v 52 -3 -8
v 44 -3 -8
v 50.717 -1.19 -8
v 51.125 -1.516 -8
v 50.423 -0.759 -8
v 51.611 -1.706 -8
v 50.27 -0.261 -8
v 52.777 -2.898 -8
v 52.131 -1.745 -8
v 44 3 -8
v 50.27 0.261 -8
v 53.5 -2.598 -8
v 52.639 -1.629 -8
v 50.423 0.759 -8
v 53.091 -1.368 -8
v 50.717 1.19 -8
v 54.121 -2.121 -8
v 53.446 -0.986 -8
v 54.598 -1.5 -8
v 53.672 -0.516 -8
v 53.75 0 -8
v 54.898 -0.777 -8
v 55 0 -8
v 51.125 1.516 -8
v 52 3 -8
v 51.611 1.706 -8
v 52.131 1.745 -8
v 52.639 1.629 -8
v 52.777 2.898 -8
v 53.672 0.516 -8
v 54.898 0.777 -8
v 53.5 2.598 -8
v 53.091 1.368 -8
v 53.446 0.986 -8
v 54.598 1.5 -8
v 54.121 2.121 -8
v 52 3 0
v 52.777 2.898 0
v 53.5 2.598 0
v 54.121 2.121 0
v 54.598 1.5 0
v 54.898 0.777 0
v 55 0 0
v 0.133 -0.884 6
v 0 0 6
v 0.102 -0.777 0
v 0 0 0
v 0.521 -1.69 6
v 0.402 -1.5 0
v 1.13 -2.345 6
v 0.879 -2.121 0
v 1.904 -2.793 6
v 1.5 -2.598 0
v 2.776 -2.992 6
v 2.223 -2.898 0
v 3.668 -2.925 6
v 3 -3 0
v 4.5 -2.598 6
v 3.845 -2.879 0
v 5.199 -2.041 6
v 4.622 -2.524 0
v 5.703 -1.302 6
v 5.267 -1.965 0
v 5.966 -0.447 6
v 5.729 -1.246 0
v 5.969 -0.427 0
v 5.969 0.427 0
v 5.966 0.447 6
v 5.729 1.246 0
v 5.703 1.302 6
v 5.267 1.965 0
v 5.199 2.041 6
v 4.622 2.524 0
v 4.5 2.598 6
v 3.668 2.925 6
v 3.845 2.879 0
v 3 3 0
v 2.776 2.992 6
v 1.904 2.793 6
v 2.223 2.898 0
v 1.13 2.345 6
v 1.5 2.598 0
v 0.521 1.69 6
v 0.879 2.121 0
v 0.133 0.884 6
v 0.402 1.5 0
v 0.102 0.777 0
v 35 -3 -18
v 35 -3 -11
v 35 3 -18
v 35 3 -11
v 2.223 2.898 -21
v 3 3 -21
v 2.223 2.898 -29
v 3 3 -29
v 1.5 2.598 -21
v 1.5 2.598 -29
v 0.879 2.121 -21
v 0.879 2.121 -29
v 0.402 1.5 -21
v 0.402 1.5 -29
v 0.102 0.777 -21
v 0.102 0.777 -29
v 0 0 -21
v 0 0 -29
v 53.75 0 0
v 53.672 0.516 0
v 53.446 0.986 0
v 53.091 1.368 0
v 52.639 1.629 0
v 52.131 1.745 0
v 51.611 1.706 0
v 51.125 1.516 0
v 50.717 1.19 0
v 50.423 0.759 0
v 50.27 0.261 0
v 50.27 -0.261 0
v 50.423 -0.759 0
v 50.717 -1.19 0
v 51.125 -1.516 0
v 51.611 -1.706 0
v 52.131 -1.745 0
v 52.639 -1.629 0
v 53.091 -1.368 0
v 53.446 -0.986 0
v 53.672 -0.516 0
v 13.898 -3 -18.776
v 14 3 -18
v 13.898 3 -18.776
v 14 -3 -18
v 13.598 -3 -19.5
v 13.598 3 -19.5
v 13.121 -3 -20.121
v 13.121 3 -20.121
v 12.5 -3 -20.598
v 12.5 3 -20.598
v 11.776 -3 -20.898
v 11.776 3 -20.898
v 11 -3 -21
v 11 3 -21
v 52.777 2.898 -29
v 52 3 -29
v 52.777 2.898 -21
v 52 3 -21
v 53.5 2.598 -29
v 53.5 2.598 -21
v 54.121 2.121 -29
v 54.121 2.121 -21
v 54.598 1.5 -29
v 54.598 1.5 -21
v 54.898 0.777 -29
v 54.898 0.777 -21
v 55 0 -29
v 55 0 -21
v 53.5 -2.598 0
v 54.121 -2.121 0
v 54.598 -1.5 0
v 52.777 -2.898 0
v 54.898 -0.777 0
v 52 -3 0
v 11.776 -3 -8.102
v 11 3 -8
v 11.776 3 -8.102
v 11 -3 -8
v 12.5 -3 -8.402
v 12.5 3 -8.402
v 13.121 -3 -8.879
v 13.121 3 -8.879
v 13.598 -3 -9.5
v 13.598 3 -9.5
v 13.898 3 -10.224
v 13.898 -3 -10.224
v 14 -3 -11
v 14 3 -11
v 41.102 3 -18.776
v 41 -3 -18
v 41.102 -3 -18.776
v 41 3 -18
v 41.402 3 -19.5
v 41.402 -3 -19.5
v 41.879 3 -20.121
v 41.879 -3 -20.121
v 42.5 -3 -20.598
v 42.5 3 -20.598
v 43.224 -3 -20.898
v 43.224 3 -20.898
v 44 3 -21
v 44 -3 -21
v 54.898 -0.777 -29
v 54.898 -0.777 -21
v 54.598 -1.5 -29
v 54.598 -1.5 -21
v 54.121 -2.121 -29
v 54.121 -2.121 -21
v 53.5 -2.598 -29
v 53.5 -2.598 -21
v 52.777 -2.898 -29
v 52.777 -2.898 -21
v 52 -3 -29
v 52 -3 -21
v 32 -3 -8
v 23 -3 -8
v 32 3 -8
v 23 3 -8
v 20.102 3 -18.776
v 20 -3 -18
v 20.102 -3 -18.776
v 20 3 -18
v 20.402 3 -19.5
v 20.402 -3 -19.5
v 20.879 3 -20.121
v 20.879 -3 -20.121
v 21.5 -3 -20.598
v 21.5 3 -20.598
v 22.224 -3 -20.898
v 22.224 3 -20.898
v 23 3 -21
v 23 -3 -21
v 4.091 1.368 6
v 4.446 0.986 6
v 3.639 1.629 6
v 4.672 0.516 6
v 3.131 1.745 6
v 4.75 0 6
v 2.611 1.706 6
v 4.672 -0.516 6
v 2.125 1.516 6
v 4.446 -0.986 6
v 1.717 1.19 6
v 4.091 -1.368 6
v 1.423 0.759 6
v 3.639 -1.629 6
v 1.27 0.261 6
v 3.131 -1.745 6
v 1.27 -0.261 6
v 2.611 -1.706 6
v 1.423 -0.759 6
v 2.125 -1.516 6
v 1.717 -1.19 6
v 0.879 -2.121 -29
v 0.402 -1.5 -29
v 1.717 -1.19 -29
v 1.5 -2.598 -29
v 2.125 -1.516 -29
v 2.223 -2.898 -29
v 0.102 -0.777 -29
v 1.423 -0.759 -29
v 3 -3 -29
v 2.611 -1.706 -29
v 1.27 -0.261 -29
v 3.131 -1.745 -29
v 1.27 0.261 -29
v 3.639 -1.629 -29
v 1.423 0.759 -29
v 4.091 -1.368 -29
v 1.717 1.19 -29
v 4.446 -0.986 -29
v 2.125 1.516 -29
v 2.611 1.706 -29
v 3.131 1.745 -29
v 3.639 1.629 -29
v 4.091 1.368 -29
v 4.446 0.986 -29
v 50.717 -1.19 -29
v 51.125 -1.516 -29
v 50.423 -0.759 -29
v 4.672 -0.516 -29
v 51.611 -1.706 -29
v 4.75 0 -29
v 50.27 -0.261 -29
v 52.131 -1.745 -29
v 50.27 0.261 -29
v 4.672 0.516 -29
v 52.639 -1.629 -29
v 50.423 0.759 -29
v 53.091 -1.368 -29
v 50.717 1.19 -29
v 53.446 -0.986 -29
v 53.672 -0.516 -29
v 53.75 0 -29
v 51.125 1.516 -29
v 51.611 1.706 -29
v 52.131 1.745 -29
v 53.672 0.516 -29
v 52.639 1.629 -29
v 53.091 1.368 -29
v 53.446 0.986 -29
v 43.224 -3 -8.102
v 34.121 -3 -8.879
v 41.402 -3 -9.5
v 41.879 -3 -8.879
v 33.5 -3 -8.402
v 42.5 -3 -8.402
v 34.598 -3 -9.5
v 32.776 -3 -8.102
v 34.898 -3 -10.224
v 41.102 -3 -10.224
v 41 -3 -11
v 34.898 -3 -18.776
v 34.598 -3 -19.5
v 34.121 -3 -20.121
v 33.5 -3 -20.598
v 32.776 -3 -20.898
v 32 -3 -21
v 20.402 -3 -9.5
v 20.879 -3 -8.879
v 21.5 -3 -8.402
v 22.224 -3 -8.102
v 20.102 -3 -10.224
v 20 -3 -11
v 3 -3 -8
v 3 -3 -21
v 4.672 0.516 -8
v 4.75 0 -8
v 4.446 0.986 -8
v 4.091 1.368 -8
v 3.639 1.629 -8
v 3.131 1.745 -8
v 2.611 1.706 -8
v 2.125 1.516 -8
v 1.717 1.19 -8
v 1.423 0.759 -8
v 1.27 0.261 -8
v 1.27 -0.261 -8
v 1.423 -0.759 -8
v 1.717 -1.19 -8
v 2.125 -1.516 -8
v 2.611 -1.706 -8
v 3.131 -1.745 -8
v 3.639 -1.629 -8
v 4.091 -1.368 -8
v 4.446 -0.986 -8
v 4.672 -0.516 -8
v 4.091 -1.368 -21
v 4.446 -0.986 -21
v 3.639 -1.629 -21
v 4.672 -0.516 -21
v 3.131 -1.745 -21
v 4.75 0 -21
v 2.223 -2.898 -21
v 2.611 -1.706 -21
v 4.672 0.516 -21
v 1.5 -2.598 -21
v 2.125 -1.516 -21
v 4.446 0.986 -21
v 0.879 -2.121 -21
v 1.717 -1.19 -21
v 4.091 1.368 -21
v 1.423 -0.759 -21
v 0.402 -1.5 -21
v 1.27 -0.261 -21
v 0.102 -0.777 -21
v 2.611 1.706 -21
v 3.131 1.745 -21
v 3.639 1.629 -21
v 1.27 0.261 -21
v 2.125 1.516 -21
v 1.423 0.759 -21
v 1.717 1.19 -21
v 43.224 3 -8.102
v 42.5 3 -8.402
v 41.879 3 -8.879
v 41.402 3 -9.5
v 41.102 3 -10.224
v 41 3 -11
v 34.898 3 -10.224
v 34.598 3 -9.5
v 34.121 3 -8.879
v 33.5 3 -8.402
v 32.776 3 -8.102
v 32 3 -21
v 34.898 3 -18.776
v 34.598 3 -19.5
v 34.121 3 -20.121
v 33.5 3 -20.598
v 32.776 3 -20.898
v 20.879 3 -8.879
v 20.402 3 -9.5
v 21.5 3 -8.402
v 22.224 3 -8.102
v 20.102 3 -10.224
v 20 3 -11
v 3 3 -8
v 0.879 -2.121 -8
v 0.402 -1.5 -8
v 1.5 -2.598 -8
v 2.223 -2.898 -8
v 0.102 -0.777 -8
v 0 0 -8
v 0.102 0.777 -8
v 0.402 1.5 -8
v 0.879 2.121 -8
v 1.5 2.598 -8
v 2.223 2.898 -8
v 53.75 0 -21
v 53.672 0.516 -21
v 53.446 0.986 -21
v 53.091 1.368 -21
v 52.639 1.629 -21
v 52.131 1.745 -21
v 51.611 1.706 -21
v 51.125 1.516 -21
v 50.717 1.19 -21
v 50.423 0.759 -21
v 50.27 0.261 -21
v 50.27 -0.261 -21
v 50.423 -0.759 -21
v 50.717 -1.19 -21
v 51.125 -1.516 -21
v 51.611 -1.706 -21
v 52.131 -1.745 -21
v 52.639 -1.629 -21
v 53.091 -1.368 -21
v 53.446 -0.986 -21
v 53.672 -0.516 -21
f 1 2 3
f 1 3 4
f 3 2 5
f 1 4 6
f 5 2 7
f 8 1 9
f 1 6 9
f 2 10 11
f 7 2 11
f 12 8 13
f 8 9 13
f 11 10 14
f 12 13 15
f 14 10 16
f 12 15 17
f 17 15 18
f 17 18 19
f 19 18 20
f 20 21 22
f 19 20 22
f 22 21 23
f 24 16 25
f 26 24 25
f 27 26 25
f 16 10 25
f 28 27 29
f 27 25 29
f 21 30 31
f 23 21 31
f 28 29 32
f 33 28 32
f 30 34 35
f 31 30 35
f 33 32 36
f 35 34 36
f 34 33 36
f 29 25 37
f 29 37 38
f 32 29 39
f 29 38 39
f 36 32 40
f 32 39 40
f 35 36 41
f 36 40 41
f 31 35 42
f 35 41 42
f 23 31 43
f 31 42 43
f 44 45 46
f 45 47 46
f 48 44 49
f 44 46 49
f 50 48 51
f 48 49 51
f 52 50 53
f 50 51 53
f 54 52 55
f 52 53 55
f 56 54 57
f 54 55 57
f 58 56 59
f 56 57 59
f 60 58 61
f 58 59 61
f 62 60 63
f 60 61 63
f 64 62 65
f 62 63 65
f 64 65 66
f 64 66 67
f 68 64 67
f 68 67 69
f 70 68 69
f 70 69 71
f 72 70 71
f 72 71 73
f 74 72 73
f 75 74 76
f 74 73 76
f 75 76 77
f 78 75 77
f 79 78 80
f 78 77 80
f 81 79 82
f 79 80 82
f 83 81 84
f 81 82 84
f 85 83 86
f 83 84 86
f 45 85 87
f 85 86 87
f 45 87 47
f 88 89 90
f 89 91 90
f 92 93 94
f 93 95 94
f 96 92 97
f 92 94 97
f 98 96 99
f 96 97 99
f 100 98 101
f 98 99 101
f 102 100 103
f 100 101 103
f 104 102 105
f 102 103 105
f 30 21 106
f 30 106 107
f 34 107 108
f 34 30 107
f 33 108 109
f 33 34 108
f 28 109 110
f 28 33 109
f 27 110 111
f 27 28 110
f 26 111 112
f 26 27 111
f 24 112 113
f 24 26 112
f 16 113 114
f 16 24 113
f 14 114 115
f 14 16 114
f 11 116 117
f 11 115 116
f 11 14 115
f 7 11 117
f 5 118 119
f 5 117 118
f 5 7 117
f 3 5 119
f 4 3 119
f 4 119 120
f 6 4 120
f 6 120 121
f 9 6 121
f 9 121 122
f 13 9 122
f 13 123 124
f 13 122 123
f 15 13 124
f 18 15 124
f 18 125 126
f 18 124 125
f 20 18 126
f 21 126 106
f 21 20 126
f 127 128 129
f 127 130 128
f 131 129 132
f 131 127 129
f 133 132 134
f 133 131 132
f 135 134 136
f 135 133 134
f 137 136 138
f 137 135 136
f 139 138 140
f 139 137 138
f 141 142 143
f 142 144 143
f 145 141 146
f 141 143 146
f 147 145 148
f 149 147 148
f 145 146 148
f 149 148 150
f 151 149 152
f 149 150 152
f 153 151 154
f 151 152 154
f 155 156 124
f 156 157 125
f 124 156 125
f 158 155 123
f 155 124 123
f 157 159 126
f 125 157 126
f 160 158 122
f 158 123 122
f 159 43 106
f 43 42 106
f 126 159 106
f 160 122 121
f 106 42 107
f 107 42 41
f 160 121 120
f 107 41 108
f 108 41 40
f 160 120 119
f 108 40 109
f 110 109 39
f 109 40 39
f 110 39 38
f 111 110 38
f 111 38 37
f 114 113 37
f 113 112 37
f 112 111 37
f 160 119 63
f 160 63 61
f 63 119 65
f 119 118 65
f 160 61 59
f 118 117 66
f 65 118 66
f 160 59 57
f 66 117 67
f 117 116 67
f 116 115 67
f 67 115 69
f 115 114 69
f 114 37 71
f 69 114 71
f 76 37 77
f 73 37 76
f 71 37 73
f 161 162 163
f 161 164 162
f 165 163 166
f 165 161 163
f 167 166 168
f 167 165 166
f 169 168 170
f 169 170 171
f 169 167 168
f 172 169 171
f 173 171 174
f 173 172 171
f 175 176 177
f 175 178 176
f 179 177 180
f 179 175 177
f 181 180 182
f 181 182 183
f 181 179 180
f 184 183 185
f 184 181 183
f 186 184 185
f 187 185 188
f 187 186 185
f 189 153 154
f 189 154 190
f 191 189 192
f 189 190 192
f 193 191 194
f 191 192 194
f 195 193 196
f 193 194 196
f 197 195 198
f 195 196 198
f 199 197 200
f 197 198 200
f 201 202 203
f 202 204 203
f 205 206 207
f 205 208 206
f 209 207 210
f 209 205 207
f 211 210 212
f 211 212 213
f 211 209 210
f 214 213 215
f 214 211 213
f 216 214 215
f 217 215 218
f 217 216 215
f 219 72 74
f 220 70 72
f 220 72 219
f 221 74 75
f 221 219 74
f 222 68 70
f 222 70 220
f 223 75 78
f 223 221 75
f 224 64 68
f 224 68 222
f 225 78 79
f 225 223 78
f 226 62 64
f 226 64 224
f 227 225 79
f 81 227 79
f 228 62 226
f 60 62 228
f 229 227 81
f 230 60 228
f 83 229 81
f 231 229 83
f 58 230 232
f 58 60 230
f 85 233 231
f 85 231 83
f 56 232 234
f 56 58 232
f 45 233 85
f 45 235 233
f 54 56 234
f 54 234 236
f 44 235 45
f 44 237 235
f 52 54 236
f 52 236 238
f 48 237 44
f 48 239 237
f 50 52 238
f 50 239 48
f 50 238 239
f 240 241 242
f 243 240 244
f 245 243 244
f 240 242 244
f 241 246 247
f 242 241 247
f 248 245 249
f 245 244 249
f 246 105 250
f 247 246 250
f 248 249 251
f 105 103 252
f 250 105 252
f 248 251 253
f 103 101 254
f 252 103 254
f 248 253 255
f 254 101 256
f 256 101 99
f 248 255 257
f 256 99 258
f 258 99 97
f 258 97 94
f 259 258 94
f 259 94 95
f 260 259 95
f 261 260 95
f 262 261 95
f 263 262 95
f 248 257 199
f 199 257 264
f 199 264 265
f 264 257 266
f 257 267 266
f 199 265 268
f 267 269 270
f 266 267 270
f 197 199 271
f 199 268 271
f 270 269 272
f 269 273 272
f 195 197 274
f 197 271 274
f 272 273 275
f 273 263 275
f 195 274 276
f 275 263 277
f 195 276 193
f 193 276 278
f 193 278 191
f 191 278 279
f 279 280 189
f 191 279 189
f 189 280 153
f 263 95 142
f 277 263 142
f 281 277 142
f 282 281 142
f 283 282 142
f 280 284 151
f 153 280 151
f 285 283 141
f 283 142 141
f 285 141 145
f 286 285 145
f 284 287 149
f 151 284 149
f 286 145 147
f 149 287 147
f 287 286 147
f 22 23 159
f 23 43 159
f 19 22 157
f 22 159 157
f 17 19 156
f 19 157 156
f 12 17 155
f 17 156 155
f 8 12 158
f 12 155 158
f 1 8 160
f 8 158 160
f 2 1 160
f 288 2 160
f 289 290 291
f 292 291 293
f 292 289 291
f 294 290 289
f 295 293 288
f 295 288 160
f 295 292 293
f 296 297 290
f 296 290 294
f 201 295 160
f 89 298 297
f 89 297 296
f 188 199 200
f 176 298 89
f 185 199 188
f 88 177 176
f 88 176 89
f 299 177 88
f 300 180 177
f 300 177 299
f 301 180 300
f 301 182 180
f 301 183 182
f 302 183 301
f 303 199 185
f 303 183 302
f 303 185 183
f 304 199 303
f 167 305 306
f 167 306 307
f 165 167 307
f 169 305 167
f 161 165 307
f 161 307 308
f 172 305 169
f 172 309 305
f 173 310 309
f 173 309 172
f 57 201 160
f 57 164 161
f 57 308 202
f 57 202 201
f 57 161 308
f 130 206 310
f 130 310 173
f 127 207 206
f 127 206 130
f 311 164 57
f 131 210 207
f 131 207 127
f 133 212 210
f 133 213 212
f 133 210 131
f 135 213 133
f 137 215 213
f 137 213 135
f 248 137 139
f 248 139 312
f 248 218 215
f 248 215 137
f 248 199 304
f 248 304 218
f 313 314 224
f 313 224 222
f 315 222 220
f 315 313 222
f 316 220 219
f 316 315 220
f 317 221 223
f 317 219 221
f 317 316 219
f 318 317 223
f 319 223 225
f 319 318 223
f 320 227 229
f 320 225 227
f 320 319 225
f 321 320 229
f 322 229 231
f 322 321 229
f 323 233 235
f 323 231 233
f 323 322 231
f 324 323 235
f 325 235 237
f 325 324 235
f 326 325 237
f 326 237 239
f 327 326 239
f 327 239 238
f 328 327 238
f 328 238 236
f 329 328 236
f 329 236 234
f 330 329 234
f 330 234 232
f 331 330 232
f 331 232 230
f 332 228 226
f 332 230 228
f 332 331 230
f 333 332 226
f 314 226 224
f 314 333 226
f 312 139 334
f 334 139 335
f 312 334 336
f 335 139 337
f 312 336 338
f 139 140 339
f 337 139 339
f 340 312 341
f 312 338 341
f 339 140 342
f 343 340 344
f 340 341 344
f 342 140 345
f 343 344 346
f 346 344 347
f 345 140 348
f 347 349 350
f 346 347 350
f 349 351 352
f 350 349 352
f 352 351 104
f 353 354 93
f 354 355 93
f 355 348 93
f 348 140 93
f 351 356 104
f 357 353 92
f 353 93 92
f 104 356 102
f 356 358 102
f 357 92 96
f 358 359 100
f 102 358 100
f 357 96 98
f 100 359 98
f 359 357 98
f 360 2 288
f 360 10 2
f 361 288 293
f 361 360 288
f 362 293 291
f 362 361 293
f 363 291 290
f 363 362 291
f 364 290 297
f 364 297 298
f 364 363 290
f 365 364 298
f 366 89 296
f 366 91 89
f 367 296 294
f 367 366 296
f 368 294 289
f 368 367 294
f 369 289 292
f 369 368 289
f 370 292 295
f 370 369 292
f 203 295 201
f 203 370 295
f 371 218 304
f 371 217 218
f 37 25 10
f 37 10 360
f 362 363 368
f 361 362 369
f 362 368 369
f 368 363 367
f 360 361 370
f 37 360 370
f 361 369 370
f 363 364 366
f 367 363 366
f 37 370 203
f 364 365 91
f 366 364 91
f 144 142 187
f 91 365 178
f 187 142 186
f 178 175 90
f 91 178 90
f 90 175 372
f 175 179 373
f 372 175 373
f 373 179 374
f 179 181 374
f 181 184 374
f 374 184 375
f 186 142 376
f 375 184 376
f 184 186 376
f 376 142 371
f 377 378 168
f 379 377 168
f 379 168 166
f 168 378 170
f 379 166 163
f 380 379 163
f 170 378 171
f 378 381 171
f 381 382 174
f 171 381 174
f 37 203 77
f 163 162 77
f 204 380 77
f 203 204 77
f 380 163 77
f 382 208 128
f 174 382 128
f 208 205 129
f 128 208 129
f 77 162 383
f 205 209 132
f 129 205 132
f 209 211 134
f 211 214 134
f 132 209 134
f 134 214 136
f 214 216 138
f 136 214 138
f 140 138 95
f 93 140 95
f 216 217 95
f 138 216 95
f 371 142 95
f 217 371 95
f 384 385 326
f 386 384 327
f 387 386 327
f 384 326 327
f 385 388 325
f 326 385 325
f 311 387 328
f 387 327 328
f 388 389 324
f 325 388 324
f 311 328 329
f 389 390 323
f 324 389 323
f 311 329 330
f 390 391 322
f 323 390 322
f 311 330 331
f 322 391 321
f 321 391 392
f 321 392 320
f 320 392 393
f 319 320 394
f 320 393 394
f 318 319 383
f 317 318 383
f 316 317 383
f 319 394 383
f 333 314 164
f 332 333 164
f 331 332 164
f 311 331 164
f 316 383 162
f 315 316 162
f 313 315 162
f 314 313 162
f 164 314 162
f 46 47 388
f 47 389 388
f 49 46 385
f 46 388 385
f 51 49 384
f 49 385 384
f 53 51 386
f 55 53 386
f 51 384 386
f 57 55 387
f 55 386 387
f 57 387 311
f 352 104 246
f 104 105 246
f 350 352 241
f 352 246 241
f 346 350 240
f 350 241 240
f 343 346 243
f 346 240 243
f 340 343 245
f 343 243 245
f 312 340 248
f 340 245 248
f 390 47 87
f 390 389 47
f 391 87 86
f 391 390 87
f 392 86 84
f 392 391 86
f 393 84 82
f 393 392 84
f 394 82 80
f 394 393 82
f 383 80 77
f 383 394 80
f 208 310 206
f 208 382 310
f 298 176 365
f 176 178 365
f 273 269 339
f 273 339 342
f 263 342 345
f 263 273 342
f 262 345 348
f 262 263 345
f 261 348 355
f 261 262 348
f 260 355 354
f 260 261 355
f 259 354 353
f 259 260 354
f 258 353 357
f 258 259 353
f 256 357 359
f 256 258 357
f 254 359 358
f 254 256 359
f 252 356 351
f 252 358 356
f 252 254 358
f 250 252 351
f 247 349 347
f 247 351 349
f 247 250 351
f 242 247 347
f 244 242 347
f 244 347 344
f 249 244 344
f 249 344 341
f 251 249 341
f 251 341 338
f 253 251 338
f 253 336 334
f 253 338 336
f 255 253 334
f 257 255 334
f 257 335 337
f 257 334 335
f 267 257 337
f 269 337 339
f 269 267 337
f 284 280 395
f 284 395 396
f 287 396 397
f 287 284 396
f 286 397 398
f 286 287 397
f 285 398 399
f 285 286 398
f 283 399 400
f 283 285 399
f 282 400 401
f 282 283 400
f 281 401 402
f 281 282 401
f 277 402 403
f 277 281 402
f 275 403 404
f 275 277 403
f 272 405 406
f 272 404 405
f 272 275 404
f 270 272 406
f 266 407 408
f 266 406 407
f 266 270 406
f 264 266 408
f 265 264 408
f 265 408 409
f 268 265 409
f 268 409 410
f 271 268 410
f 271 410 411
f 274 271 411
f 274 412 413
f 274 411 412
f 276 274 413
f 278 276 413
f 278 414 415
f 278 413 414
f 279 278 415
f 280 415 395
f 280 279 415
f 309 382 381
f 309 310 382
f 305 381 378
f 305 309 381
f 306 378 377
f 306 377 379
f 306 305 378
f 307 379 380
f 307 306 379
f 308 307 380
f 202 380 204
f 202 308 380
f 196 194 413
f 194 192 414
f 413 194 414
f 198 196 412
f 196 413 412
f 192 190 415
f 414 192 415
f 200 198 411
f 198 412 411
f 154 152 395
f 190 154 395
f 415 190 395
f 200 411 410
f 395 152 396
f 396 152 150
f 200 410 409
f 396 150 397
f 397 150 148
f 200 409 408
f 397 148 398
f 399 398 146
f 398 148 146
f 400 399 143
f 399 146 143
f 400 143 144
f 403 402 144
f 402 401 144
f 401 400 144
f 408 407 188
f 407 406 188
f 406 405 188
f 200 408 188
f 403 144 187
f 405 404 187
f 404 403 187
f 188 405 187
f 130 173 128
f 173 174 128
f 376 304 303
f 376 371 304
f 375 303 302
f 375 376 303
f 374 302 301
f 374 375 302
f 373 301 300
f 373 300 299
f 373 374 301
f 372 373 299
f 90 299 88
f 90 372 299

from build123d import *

# Parameters (mm, degrees)
CROQUIS1_W                 = 15
CROQUIS1_H                 = 13
SALIENTE_EXTRUIR1_DEPTH    = 3
REDONDEO1_R                = 3
CROQUIS6_R                 = 3
SALIENTE_EXTRUIR2_DEPTH    = 6
CORTAR_EXTRUIR1_DEPTH      = 66.261014396
CORTAR_EXTRUIR1_DEPTH_BACK = 66.261014396
CROQUIS2_R                 = 1.75
CORTAR_EXTRUIR2_DEPTH      = 63.24949799
CORTAR_EXTRUIR2_DEPTH_BACK = 63.24949799
CROQUIS3_R                 = 1.75
REDONDEO2_R                = 3


with BuildPart() as part:
    # Croquis1 → Saliente-Extruir1 (new, symmetric)
    with BuildSketch(Plane(origin=(0, 0, 0), x_dir=(1, 0, 0), z_dir=(0, 1, 0))):
        Polygon((0, 0), (0, 8), (14, 8), (14, 21), (0, 21), (0, 29), (55, 29), (55, 21), (41, 21), (41, 8), (55, 8), (55, 0), align=None)
        with Locations((27.5, 14.5)):
            Rectangle(CROQUIS1_W, CROQUIS1_H, mode=Mode.SUBTRACT)
    extrude(amount=SALIENTE_EXTRUIR1_DEPTH, both=True)

    # Redondeo1
    redondeo1_edges = [part.edges().sort_by_distance(p)[0] for p in [
        (0, -3, -4),
        (0, 3, -4),
        (0, -3, -25),
        (0, 3, -25),
        (55, -3, -4),
        (55, 3, -4),
        (55, 3, -25),
        (55, -3, -25),
    ]]
    fillet(redondeo1_edges, radius=REDONDEO1_R - 0.0001)  # a hair under: the kernel refuses the full size

    # Croquis6 → Saliente-Extruir2 (add)
    with BuildSketch(Plane.XY):
        with Locations(Location((3, 0, 0), (0, 0, 180))):
            Circle(CROQUIS6_R)
    extrude(amount=SALIENTE_EXTRUIR2_DEPTH)

    # Croquis2 → Cortar-Extruir1 (cut, two sides: drawn at the far end of the back side and taken through both)
    with BuildSketch(Plane.XY.offset(6).offset(-CORTAR_EXTRUIR1_DEPTH_BACK)):
        with Locations((3, 0)):
            Circle(CROQUIS2_R)
    extrude(amount=CORTAR_EXTRUIR1_DEPTH + CORTAR_EXTRUIR1_DEPTH_BACK, mode=Mode.SUBTRACT)

    # Croquis3 → Cortar-Extruir2 (cut, two sides: drawn at the far end of the back side and taken through both)
    with BuildSketch(Plane.XY.offset(-CORTAR_EXTRUIR2_DEPTH_BACK)):
        with Locations((52, 0)):
            Circle(CROQUIS3_R)
    extrude(amount=CORTAR_EXTRUIR2_DEPTH + CORTAR_EXTRUIR2_DEPTH_BACK, mode=Mode.SUBTRACT)

    # Redondeo2
    redondeo2_edges = [part.edges().sort_by_distance(p)[0] for p in [
        (14, 0, -8),
        (14, 0, -21),
        (41, 0, -21),
        (41, 0, -8),
        (20, 0, -21),
        (20, 0, -8),
        (35, 0, -8),
        (35, 0, -21),
    ]]
    fillet(redondeo2_edges, radius=REDONDEO2_R)


solid = part.part
